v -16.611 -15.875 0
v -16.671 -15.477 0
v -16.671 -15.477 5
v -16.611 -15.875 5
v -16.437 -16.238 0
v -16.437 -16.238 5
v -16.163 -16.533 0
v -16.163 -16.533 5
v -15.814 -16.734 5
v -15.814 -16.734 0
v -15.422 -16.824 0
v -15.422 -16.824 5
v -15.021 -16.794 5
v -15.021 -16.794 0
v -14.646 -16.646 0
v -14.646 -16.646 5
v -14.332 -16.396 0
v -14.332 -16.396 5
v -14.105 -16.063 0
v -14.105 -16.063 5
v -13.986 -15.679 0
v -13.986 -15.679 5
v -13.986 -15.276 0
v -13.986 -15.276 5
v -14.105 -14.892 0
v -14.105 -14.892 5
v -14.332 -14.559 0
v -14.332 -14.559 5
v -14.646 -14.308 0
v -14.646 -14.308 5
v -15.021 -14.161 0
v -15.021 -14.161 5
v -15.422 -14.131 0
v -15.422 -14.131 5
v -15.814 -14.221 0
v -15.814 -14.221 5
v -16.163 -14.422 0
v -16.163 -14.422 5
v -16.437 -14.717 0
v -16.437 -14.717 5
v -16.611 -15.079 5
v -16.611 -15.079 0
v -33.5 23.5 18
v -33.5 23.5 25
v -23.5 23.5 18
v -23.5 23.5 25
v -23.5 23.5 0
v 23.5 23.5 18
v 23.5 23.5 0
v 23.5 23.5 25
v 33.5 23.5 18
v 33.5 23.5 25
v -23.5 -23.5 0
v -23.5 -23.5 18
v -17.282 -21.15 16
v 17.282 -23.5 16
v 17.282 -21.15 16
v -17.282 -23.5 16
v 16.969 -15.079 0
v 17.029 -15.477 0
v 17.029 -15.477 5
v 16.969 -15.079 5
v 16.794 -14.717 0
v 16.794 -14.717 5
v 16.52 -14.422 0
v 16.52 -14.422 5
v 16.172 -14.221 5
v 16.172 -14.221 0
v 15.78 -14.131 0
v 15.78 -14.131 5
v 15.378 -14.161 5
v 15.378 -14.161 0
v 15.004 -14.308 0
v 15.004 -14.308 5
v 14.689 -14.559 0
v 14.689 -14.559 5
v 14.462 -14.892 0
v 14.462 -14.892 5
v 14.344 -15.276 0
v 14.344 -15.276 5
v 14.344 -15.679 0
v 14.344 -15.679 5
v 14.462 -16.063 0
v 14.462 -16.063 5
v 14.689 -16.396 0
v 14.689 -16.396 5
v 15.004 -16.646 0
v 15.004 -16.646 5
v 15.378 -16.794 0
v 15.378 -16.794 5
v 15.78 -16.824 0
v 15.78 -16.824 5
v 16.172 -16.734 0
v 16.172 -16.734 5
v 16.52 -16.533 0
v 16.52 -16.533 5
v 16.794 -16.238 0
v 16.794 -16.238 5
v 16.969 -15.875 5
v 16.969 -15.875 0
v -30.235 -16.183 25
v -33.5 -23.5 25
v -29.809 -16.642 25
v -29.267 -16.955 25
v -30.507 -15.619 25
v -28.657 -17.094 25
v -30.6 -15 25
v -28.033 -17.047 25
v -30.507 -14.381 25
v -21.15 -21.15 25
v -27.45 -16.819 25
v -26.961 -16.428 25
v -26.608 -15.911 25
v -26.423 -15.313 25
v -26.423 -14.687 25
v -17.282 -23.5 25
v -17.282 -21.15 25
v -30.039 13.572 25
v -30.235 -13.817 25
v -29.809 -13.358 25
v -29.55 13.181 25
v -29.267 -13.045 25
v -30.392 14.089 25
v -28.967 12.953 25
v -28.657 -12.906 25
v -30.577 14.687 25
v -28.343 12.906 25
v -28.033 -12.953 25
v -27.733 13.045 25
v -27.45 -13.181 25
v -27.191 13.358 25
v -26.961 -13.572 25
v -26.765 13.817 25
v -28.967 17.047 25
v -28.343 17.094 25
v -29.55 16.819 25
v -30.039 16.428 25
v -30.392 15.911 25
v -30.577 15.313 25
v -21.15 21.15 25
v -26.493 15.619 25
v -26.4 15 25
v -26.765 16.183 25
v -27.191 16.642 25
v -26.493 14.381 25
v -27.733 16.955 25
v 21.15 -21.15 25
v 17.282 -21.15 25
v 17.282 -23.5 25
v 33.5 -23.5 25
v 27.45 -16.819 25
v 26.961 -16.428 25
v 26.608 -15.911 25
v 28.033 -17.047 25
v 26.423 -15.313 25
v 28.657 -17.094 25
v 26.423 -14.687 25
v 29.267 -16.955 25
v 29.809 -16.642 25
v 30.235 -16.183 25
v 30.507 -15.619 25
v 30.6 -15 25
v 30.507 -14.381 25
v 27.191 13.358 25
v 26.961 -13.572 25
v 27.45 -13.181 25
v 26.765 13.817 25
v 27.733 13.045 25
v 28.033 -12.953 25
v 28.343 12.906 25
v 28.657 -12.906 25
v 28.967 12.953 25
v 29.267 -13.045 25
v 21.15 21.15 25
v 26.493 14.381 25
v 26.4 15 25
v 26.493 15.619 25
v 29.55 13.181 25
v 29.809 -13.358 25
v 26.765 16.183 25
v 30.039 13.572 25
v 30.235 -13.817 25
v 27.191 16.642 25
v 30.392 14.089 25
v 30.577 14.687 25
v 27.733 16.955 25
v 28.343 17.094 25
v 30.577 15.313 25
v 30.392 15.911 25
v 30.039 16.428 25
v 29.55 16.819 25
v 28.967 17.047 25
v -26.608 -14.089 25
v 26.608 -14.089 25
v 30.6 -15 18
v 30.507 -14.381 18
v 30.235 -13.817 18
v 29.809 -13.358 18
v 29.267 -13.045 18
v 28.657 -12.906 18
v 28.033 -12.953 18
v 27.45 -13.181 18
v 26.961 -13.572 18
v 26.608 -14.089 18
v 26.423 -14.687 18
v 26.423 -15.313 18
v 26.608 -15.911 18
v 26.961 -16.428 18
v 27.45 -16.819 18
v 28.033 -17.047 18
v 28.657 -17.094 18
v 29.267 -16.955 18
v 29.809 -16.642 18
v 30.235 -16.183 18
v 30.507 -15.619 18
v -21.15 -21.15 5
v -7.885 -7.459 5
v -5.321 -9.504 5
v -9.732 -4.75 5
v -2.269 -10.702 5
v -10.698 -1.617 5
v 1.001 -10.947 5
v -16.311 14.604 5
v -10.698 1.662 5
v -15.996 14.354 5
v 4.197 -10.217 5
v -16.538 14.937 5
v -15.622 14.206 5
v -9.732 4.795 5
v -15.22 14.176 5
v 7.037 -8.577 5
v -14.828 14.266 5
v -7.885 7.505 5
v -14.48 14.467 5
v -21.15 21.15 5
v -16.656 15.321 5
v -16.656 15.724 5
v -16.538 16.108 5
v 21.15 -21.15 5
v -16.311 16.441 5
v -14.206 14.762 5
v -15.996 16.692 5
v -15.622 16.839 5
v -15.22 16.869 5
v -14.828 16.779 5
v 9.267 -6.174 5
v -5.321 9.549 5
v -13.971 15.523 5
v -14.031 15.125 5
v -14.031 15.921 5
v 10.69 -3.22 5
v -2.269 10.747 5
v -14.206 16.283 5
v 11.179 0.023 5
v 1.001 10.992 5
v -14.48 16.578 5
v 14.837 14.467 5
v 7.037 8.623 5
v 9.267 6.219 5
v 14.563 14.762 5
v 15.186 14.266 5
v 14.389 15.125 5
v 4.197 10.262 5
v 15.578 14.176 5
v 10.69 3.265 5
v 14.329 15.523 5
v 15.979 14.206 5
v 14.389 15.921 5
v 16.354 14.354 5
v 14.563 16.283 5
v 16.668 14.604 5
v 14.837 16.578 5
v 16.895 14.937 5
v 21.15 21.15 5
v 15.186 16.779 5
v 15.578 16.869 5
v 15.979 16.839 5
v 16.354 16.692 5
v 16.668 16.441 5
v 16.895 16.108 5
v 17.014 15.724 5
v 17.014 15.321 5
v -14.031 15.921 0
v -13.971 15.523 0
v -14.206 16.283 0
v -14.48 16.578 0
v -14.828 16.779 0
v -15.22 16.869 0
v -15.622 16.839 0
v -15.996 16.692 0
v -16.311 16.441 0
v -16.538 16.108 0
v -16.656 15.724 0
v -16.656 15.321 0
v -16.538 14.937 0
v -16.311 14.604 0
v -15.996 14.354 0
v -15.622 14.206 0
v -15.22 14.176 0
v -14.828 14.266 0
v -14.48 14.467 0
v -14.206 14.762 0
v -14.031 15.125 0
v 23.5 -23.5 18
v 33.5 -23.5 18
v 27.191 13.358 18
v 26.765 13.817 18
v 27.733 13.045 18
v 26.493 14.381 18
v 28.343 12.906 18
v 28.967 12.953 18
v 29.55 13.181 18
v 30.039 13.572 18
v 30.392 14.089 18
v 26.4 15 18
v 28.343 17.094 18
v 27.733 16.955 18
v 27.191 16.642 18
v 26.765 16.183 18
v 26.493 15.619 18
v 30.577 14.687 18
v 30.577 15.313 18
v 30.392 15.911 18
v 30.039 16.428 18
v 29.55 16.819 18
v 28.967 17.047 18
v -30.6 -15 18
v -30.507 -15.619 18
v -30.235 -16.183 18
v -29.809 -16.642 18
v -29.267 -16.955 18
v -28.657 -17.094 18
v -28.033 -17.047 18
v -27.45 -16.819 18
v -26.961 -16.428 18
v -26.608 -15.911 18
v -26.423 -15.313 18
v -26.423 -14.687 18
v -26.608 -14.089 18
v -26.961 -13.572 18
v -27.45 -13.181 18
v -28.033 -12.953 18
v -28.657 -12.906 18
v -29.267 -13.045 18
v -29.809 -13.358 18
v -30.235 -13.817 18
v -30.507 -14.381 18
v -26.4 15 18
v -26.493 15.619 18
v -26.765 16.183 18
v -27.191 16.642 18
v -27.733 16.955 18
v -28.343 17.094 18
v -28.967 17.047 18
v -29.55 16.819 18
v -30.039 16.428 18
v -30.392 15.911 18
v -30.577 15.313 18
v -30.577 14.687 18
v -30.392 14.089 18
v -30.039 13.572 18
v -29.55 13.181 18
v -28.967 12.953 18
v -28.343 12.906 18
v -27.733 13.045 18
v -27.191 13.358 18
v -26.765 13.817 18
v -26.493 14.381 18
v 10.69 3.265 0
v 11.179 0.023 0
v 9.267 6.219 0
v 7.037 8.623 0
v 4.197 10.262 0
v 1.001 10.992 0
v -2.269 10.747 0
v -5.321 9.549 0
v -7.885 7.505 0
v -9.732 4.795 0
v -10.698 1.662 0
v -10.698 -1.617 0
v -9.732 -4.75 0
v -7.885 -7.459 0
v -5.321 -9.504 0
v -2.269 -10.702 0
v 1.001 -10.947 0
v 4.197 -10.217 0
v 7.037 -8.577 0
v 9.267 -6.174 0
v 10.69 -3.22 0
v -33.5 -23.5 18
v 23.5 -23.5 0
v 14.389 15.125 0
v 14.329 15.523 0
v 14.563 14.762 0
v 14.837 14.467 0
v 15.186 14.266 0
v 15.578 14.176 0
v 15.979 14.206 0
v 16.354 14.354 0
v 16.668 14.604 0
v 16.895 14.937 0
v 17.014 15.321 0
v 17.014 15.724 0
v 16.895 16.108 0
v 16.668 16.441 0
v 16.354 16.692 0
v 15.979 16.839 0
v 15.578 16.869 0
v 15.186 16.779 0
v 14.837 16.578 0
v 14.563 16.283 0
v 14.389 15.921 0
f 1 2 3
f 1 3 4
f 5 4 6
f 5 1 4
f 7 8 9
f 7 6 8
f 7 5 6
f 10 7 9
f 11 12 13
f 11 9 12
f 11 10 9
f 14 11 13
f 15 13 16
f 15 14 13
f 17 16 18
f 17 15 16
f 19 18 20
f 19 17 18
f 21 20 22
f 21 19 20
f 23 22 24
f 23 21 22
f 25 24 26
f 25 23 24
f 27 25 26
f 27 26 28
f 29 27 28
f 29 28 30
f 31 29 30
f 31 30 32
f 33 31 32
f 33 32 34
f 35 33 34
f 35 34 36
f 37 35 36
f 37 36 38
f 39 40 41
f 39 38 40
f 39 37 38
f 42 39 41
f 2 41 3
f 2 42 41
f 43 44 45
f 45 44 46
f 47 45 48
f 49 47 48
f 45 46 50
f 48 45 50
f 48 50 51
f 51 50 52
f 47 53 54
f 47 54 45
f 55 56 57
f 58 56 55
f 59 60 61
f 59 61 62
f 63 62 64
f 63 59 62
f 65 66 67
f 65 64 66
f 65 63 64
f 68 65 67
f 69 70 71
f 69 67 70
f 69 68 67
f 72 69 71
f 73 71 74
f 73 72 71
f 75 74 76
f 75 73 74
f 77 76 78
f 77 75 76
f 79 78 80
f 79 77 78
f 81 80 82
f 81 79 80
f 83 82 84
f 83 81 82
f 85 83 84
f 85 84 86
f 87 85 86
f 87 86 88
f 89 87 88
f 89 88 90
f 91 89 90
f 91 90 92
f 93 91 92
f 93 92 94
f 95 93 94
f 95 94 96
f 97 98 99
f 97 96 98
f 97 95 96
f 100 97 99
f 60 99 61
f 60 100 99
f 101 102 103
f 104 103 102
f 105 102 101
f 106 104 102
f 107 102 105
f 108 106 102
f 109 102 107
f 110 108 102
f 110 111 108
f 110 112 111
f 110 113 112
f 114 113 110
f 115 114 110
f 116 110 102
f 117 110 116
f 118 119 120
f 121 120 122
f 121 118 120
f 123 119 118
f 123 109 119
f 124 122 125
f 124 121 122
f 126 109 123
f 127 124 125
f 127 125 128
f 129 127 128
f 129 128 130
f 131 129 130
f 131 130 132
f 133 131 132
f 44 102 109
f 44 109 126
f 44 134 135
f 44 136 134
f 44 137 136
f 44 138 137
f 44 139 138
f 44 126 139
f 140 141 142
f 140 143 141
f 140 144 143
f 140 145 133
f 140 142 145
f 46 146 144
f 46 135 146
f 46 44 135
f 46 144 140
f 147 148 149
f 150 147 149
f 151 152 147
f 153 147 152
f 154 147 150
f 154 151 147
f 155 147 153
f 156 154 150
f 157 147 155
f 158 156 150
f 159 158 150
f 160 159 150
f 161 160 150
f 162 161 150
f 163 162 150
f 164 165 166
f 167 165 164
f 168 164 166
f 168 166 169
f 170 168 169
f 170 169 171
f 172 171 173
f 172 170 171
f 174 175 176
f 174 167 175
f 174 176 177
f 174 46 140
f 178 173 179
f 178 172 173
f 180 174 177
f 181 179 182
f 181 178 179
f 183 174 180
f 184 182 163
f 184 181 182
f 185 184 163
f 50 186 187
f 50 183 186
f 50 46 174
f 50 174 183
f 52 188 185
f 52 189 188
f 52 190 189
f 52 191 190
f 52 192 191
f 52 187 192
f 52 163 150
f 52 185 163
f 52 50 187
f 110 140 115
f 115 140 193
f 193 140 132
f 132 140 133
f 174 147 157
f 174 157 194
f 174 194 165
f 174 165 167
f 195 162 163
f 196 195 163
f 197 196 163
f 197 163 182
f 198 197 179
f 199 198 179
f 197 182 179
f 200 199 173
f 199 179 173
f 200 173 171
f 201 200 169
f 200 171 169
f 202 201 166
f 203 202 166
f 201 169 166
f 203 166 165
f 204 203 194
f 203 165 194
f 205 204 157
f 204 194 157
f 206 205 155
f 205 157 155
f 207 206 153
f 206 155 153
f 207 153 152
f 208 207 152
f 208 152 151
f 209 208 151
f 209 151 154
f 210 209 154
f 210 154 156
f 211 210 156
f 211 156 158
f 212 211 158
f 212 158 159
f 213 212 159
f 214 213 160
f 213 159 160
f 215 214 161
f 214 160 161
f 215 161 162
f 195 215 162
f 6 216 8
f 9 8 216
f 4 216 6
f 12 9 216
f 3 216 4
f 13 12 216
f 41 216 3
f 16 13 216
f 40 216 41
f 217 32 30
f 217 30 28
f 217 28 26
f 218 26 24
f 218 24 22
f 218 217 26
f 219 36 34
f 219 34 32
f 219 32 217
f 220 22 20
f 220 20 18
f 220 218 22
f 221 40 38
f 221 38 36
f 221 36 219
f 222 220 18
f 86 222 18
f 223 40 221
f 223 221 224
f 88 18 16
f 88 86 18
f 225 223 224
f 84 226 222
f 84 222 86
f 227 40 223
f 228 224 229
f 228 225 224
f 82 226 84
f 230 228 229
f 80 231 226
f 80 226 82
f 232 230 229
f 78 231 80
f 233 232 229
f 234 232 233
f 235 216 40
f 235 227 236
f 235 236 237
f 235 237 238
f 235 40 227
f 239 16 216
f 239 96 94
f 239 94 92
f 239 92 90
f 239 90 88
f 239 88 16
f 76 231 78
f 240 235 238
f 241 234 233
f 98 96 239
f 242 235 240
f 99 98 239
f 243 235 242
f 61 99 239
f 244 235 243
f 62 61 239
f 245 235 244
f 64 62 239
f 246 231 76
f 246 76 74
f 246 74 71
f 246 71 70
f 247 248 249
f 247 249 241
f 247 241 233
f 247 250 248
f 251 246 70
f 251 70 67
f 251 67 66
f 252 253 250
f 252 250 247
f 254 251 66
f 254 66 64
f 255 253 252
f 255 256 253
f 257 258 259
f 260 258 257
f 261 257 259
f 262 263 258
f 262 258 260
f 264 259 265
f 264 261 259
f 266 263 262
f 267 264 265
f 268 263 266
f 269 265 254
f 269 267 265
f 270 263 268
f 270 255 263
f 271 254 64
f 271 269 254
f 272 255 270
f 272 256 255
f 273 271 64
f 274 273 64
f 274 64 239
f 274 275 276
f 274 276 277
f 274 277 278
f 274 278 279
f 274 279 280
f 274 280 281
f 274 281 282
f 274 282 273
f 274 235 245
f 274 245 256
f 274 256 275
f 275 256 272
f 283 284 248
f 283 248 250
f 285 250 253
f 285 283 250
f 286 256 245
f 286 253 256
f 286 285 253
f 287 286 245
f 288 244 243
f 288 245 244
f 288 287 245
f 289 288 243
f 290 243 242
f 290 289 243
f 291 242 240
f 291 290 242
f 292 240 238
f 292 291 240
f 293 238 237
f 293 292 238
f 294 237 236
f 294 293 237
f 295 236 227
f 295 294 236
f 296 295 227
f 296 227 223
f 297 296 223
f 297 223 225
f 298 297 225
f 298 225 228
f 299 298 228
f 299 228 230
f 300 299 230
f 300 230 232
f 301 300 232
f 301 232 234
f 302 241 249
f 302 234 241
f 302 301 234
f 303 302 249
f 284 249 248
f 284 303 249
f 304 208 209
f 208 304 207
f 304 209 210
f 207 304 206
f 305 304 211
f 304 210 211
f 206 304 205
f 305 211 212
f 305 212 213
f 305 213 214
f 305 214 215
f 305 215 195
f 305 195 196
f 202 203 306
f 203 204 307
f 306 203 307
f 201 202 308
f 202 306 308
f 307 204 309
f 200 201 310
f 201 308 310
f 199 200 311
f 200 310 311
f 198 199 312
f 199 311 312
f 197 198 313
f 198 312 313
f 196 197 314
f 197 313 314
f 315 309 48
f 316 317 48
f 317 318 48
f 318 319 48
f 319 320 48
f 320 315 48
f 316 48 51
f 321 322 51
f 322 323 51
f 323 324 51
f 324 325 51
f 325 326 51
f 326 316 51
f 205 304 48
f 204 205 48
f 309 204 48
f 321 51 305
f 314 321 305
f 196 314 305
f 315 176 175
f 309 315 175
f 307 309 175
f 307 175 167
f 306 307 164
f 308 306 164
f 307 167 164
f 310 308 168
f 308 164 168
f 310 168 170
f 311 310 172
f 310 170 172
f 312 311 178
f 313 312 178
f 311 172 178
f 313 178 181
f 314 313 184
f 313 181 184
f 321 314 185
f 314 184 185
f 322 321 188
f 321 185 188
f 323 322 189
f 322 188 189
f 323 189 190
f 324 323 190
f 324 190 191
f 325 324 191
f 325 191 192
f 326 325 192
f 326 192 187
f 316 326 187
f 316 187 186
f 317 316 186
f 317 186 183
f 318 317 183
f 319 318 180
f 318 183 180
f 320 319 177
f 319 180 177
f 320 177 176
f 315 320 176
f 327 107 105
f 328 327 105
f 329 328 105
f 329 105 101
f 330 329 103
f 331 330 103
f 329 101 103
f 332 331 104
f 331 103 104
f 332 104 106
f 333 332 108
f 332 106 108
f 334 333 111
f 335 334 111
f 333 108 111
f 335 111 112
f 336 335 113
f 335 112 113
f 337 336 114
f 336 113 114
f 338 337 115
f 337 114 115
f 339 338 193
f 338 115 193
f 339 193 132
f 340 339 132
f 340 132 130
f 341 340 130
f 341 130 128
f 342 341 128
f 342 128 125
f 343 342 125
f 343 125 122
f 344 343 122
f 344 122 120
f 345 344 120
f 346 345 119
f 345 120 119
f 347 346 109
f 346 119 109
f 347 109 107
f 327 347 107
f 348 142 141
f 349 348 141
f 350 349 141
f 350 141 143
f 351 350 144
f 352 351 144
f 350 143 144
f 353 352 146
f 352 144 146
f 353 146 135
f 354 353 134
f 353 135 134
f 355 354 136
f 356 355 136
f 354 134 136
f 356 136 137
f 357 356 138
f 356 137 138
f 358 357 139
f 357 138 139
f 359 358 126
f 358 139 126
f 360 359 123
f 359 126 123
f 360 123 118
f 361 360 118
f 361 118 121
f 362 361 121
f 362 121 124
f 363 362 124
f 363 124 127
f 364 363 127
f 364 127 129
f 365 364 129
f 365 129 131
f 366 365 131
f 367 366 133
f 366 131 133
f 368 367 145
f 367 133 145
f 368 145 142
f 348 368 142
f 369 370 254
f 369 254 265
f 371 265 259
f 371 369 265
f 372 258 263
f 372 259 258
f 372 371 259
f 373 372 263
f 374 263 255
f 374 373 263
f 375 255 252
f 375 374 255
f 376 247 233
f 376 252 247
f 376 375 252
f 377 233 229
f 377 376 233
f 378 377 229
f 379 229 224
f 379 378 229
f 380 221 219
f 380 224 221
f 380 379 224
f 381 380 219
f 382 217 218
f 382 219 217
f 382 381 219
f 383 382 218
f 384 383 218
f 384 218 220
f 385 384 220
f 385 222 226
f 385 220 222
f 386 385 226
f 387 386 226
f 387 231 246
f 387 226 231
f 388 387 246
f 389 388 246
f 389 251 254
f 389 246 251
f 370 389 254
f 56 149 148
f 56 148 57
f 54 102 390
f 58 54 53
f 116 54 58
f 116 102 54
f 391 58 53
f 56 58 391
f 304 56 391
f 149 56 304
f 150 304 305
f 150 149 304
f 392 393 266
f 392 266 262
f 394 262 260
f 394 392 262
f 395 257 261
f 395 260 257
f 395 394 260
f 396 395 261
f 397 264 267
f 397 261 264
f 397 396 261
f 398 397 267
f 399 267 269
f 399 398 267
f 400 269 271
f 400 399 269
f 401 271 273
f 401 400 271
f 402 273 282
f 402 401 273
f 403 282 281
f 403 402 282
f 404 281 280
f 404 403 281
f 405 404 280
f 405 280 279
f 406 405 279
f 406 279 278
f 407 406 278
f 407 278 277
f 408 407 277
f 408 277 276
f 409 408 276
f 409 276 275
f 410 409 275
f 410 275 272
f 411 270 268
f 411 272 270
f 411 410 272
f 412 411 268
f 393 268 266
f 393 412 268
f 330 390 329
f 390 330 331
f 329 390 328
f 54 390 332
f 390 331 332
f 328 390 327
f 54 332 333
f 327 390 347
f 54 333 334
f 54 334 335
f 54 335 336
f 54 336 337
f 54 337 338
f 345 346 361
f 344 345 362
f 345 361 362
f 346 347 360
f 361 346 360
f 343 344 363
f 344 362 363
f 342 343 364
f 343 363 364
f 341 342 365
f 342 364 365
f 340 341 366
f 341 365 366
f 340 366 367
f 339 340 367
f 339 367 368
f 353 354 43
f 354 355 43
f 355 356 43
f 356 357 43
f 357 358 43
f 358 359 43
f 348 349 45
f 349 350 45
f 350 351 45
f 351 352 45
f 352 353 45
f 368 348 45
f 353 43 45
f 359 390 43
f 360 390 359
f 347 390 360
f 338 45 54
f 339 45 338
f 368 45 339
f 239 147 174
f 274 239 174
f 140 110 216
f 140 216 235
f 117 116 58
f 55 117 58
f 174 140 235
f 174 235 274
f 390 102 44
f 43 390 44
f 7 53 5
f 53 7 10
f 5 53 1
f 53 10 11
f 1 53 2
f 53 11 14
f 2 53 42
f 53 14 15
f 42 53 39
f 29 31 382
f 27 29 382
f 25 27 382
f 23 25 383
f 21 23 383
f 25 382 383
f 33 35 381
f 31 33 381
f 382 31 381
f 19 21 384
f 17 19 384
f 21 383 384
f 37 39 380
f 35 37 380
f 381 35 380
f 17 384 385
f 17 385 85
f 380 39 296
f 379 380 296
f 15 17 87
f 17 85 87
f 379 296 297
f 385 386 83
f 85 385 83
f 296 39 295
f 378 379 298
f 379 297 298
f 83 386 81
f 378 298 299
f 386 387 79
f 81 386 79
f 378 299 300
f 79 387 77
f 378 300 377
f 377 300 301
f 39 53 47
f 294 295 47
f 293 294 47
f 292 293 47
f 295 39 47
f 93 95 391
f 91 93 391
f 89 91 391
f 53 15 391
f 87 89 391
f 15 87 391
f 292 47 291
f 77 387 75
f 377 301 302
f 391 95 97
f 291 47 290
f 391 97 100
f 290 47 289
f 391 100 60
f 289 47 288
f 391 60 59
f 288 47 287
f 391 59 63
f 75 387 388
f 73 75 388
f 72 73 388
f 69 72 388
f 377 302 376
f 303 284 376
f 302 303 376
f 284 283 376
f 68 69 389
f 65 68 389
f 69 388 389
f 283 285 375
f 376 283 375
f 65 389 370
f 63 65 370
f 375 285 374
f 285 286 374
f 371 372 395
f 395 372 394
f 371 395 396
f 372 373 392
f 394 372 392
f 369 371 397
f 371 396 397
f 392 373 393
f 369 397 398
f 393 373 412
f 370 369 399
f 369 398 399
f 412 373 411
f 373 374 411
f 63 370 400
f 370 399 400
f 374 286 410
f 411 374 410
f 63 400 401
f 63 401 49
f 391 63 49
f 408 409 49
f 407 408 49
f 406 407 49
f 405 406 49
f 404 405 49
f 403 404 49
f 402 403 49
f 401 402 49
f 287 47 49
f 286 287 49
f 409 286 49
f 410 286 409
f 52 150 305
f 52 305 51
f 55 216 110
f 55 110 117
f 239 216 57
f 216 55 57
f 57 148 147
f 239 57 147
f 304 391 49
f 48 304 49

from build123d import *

# Parameters (mm, degrees)
SKETCH_1_W               = 47
SKETCH_1_H               = 47
EXTRUDE_1_DEPTH          = 53
SKETCH_2_W               = 42.3
SKETCH_2_H               = 42.3
CUT_EXTRUDE_1_DEPTH      = 48
CUT_EXTRUDE_2_DEPTH      = 59.38236035
CUT_EXTRUDE_2_DEPTH_BACK = 59.38236035
SKETCH_3_R               = 11
SKETCH_3_R_2             = 1.35
SKETCH_7_W               = 28
SKETCH_7_H               = 47.225094233
CUT_EXTRUDE_5_DEPTH      = 47.5
SKETCH_20_W              = 10
SKETCH_20_H              = 47
SKETCH_20_R              = 2.1
EXTRUDE_2_DEPTH          = 7
SKETCH_23_W              = 34.56360228
SKETCH_23_H              = 9
CUT_EXTRUDE_8_DEPTH      = 2.35


with BuildPart() as part:
    # Эскиз1 → Бобышка-Вытянуть1 (new body)
    with BuildSketch(Plane.XY):
        Rectangle(SKETCH_1_W, SKETCH_1_H)
    extrude(amount=EXTRUDE_1_DEPTH)

    # Эскиз2 → Вырез-Вытянуть1 (cut)
    with BuildSketch(Plane.XY.offset(53)):
        Rectangle(SKETCH_2_W, SKETCH_2_H)
    extrude(amount=-CUT_EXTRUDE_1_DEPTH, mode=Mode.SUBTRACT)

    # Эскиз3 → Вырез-Вытянуть2 (cut, two sides: drawn at the far end of the back side and taken through both)
    with BuildSketch(Plane.XY.offset(5).offset(-CUT_EXTRUDE_2_DEPTH_BACK)):
        with Locations((0.178742266, 0.022649375)):
            Circle(SKETCH_3_R)
        with Locations((-15.321257734, 15.522649375)):
            Circle(SKETCH_3_R_2)
        with Locations(Location((15.678742266, 15.522649375, 0), (0, 0, 180))):
            Circle(SKETCH_3_R_2)
        with Locations((15.678742266, -15.477350625)):
            Circle(SKETCH_3_R_2)
        with Locations(Location((-15.321257734, -15.477350625, 0), (0, 0, 180))):
            Circle(SKETCH_3_R_2)
    extrude(amount=CUT_EXTRUDE_2_DEPTH + CUT_EXTRUDE_2_DEPTH_BACK, mode=Mode.SUBTRACT)

    # Эскиз7 → Вырез-Вытянуть5 (cut)
    with BuildSketch(Plane(origin=(23.5, 0, 0), x_dir=(0, 0, -1), z_dir=(1, 0, 0))):
        with Locations((-39, -0.112547117)):
            Rectangle(SKETCH_7_W, SKETCH_7_H)
    extrude(amount=-CUT_EXTRUDE_5_DEPTH, mode=Mode.SUBTRACT)

    # Эскиз20 → Бобышка-Вытянуть2 (add)
    # profile 1 of 2: a face of its own
    with BuildSketch(Plane.XY.offset(25)):
        with Locations((-28.5, 0)):
            Rectangle(SKETCH_20_W, SKETCH_20_H)
        with Locations((-28.5, 15)):
            Circle(SKETCH_20_R, mode=Mode.SUBTRACT)
        with Locations(Location((-28.5, -15, 0), (0, 0, 180))):
            Circle(SKETCH_20_R, mode=Mode.SUBTRACT)
    # profile 2 of 2: a face of its own
    with BuildSketch(Plane.XY.offset(25)):
        with Locations((28.5, 0)):
            Rectangle(SKETCH_20_W, SKETCH_20_H)
        with Locations((28.5, -15)):
            Circle(SKETCH_20_R, mode=Mode.SUBTRACT)
        with Locations(Location((28.5, 15, 0), (0, 0, 180))):
            Circle(SKETCH_20_R, mode=Mode.SUBTRACT)
    extrude(amount=-EXTRUDE_2_DEPTH)

    # Эскиз23 → Вырез-Вытянуть8 (cut)
    with BuildSketch(Plane(origin=(0, -23.5, 0), x_dir=(-1, 0, 0), z_dir=(0, -1, 0))):
        with Locations((0, -20.5)):
            Rectangle(SKETCH_23_W, SKETCH_23_H)
    extrude(amount=-CUT_EXTRUDE_8_DEPTH, mode=Mode.SUBTRACT)


solid = part.part
